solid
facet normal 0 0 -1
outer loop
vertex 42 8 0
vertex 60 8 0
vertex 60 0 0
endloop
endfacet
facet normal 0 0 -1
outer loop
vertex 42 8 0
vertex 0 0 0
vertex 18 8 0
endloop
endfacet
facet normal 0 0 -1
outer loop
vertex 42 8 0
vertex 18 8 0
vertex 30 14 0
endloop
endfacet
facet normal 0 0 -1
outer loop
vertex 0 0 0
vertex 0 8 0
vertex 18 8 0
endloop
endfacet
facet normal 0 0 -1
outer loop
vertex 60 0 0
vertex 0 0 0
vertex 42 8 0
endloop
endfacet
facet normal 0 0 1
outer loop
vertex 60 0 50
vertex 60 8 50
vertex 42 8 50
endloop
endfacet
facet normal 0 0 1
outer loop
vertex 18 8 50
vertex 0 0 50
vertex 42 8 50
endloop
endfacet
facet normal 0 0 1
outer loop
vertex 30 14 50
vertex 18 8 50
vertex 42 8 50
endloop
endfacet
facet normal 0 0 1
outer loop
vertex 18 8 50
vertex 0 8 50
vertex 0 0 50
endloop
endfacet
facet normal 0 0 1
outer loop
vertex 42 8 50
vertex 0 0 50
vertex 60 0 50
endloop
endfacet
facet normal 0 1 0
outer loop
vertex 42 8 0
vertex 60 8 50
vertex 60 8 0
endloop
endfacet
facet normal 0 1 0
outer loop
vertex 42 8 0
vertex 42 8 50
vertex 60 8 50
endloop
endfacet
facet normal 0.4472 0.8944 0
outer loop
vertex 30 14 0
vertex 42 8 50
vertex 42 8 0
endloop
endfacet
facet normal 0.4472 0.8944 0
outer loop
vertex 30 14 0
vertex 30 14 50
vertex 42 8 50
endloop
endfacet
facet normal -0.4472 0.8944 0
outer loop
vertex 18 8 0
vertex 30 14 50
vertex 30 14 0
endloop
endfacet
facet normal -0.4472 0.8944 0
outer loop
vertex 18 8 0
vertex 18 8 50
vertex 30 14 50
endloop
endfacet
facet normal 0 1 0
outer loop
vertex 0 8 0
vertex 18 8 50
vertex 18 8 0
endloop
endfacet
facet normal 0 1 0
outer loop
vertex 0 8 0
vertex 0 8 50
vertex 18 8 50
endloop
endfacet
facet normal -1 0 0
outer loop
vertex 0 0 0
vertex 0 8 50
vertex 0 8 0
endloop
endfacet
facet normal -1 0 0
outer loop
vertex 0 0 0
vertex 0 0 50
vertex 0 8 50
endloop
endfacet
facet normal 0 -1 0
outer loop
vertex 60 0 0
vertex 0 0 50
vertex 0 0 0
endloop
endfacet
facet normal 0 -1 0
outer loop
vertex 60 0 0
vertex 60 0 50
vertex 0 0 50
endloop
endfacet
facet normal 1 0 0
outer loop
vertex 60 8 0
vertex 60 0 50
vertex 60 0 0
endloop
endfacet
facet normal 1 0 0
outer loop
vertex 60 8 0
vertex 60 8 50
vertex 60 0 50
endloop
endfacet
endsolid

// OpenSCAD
$fn = 32;

// ----------------------------------------------------------------------
// V guide rail: vrib, 60 mm wide
// ----------------------------------------------------------------------

// --- parameters (mm) ---
rail_w = 60;              // rail width, X
base_t = 8;               // base plate thickness
v_depth = 6;              // V feature depth / height
v_half_w = 12;            // half width of the V at the base face
plate_t = 50;             // rail length, Z (the extrusion height)

profile = [[0, 0], [60, 0], [60, 8], [42, 8], [30, 14], [18, 8], [0, 8]];  // primary outline, 7 points, counter clockwise

// --- the one profile operation ---
linear_extrude(height = plate_t) polygon(points = profile);
